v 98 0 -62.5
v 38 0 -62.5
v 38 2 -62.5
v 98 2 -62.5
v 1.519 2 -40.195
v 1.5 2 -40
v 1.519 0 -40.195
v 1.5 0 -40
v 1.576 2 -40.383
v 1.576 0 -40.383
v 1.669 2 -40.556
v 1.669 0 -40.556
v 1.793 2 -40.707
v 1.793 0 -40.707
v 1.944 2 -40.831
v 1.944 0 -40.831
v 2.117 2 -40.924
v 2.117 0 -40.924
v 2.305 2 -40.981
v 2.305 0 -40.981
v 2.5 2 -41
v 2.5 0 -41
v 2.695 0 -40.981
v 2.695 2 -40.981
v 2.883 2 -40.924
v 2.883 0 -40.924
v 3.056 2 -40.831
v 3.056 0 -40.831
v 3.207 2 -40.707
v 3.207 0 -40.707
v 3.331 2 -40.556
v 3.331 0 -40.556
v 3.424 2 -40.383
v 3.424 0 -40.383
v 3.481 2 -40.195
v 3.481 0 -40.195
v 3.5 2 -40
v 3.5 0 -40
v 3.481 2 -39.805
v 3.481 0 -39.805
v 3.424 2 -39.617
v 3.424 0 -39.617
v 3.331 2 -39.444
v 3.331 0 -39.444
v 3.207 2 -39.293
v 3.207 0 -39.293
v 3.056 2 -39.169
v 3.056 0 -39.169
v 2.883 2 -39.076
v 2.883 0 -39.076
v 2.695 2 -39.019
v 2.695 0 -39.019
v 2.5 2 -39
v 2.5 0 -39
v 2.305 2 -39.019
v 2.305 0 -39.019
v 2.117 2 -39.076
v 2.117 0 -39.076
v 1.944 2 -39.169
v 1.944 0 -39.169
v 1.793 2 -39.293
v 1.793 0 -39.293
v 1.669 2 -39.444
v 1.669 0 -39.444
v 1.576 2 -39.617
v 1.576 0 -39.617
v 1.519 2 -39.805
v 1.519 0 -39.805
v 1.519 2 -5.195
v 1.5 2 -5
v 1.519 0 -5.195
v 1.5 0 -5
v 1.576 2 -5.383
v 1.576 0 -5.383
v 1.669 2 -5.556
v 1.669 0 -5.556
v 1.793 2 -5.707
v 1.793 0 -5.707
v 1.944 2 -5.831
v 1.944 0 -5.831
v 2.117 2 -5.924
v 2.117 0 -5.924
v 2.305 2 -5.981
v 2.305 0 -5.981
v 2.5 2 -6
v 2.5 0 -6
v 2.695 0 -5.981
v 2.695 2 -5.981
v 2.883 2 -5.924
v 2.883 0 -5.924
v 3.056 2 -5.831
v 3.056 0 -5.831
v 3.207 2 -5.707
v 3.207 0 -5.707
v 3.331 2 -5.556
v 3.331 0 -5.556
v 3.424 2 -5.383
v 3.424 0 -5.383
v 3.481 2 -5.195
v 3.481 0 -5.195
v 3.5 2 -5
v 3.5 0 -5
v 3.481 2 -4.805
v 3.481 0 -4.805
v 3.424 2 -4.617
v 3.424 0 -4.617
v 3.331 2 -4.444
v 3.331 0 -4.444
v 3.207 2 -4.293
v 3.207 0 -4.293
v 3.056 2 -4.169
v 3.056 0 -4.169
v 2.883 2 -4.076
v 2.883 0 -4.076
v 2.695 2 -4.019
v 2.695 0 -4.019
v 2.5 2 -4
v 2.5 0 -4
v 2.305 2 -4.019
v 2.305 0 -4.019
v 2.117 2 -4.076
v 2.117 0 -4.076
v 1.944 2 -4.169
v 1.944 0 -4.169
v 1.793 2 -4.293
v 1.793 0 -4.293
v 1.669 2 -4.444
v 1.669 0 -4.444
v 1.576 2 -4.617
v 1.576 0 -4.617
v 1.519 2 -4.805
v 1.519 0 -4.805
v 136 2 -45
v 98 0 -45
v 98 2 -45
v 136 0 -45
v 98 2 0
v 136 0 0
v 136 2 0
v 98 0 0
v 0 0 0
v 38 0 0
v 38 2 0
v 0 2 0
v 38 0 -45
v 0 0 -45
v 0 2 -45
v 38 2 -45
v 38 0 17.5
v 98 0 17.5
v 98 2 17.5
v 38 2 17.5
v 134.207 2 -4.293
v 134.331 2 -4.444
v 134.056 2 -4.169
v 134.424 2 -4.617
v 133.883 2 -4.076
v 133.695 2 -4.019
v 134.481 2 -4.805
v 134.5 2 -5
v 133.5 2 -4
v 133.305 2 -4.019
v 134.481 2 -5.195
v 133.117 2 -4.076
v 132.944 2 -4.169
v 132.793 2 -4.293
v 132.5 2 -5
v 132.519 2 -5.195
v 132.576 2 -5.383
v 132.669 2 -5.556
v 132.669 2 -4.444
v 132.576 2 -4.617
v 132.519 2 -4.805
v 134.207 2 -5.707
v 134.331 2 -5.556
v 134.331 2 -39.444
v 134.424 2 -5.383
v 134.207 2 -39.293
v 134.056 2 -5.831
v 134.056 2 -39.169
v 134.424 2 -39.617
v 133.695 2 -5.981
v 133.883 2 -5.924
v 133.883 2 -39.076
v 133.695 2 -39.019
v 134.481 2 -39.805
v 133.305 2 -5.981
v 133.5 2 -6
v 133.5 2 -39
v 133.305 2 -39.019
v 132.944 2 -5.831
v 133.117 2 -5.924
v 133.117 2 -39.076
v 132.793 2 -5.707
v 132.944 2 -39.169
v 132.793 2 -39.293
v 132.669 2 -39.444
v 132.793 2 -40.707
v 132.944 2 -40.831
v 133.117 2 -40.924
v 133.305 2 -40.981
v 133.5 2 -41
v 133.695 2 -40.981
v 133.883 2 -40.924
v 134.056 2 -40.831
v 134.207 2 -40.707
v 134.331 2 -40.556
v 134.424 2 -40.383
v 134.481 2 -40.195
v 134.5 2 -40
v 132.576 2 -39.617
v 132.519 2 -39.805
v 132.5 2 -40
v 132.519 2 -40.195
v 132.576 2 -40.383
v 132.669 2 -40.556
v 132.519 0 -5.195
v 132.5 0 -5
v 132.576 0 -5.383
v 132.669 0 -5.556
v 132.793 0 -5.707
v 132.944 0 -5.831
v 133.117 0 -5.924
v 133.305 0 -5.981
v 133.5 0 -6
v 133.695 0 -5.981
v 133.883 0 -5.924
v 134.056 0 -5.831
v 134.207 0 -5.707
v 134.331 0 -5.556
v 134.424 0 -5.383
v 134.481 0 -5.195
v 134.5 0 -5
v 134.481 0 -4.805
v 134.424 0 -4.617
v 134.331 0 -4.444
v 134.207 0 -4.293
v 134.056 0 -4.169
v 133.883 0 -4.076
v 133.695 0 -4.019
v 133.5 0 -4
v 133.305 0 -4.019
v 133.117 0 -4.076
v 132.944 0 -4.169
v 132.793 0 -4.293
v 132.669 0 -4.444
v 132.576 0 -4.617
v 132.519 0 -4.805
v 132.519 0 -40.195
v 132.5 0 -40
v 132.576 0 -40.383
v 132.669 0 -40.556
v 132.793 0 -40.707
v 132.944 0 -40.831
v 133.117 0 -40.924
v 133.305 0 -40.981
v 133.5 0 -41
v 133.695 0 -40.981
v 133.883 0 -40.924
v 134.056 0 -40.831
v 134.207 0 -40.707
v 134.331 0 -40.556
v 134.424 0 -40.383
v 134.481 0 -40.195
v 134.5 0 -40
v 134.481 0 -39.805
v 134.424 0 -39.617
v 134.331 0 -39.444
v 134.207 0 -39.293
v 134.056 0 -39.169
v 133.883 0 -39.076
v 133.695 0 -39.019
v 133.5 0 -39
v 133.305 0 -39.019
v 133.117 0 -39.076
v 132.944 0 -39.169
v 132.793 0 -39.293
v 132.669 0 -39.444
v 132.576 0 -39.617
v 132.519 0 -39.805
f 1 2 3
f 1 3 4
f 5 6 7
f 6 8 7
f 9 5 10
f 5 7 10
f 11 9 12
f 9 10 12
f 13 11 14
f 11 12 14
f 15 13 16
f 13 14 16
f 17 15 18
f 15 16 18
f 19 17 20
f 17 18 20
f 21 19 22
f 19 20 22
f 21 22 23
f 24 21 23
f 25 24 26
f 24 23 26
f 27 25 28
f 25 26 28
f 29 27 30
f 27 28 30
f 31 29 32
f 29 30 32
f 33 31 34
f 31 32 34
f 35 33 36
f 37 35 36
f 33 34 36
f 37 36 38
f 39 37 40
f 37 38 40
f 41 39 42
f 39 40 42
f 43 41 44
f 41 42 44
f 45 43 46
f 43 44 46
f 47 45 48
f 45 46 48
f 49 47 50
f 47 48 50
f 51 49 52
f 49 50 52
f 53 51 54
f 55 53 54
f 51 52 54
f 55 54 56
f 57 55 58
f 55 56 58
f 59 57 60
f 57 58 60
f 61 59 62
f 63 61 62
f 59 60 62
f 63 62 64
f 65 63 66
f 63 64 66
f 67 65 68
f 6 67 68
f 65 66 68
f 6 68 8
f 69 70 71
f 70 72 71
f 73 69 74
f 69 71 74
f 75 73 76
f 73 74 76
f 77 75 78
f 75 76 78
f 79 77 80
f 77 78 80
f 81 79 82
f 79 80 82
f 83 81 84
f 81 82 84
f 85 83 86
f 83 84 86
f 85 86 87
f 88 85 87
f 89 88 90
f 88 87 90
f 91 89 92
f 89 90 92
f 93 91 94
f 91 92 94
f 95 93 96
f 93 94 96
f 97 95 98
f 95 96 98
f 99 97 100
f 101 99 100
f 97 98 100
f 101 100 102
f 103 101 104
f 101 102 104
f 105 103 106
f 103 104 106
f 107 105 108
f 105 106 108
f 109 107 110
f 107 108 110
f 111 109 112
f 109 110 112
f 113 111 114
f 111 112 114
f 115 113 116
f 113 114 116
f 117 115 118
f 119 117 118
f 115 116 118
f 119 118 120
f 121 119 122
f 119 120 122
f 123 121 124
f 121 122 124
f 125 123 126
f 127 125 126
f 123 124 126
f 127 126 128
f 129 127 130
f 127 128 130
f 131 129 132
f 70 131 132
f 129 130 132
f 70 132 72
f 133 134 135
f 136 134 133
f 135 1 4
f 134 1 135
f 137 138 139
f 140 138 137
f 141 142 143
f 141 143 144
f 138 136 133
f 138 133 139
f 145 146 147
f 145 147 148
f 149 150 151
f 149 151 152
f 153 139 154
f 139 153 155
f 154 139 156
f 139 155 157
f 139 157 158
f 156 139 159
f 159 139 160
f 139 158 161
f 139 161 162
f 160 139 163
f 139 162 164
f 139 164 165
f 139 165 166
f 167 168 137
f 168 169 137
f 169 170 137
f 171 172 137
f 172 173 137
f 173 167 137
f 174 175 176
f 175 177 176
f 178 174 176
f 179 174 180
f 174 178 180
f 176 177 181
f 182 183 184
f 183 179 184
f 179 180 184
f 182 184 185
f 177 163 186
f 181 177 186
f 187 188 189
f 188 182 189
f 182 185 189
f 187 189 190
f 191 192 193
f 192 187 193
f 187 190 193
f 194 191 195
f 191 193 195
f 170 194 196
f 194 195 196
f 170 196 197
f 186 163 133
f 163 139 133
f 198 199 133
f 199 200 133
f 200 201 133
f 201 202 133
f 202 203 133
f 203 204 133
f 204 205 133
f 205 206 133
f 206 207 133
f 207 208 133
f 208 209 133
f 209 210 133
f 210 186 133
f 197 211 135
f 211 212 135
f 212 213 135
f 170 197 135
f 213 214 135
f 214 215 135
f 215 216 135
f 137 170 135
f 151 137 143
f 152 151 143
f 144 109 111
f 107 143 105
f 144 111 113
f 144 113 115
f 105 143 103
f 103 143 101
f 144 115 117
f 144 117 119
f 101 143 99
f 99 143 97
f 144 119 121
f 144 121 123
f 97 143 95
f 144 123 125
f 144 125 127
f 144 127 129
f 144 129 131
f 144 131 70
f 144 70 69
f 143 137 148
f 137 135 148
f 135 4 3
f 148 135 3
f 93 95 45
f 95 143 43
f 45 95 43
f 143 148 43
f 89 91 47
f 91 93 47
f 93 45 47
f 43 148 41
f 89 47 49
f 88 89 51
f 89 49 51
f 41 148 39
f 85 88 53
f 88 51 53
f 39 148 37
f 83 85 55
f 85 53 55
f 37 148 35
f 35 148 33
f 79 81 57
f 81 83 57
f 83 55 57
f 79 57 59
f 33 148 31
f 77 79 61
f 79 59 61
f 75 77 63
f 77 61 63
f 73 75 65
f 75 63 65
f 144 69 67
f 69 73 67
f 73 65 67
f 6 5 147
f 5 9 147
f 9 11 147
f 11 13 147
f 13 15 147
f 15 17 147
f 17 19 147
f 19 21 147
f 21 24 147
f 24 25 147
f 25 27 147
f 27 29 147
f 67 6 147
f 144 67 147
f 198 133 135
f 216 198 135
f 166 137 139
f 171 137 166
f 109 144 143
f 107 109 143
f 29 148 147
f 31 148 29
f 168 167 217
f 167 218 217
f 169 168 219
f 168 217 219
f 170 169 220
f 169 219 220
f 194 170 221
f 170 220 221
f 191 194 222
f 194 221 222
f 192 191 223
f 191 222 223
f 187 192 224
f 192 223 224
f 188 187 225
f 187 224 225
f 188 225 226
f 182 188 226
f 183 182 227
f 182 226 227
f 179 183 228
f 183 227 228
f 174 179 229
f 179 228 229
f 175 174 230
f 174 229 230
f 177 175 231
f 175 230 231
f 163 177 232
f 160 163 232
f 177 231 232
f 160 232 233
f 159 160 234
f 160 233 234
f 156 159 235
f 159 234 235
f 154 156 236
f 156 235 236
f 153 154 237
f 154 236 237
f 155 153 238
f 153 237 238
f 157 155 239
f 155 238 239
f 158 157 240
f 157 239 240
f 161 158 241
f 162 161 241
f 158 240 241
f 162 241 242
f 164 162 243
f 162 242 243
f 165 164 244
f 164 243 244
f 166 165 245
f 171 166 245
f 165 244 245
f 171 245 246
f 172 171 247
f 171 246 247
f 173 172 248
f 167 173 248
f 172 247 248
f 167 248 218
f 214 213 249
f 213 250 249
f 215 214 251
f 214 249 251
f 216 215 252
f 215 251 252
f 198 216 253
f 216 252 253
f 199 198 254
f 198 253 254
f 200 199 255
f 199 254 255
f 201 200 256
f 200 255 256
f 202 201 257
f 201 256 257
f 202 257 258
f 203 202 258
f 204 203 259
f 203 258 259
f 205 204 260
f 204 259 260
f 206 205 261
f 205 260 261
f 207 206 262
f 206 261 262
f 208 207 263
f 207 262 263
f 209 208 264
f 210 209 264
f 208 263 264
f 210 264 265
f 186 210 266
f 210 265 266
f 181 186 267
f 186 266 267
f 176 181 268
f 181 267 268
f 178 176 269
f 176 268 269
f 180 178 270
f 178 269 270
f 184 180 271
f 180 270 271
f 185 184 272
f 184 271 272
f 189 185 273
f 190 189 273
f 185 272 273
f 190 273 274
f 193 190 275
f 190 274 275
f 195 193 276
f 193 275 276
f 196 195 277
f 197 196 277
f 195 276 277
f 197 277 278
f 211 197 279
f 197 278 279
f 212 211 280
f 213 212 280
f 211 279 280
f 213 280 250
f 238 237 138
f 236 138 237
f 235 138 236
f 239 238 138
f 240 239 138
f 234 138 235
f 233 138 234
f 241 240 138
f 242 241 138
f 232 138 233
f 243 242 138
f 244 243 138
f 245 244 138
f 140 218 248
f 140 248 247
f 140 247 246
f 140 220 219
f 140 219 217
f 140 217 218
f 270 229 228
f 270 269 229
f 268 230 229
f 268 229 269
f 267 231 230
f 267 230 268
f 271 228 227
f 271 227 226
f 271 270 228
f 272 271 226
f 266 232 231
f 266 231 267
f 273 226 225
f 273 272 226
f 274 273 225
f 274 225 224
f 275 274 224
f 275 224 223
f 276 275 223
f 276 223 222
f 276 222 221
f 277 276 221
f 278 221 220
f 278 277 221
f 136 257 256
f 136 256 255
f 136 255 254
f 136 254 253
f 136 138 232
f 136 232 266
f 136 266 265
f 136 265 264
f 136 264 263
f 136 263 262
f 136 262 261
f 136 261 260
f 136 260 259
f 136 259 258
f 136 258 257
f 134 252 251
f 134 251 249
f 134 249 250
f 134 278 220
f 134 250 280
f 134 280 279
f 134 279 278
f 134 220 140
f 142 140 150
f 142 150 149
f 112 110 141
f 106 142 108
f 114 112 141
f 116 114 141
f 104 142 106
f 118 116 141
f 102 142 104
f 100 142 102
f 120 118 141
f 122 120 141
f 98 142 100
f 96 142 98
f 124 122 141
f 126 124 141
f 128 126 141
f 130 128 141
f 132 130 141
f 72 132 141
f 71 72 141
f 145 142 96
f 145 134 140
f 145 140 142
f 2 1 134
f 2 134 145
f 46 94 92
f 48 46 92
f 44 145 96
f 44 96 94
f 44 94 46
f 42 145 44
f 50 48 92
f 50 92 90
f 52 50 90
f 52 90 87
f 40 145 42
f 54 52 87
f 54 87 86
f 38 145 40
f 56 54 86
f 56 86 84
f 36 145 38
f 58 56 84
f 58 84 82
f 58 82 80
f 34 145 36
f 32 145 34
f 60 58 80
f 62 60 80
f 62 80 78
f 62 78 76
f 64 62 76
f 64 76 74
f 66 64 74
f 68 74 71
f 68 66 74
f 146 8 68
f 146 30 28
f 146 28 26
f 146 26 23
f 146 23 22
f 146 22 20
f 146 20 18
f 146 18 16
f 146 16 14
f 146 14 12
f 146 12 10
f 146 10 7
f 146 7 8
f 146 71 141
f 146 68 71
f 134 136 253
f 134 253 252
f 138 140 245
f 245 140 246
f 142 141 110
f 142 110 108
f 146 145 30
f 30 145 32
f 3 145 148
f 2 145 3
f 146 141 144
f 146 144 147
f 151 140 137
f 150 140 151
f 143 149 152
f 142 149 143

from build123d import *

# Parameters (mm, degrees)
BOSS_EXTRUDE1_DEPTH      = 2
M2_CLEARANCE_HOLE1_D     = 2
M2_CLEARANCE_HOLE1_DEPTH = 2
M2_CLEARANCE_HOLE1_TIP   = 0.600860619


with BuildPart() as part:
    # Sketch1 → Boss-Extrude1 (new body)
    with BuildSketch(Plane(origin=(0, 0, 0), x_dir=(1, 0, 0), z_dir=(0, 1, 0))):
        Polygon((98, 45), (136, 45), (136, 0), (98, 0), (98, -17.5), (38, -17.5), (38, 0), (0, 0), (0, 45), (38, 45), (38, 62.5), (98, 62.5), align=None)
    extrude(amount=BOSS_EXTRUDE1_DEPTH)

    # M2 Clearance Hole1
    with Locations(Plane(origin=(0, 2, 0), x_dir=(1, 0, 0), z_dir=(0, 1, 0))):
        with Locations((2.5, 5), (2.5, 40), (133.5, 40), (133.5, 5)):
            Hole(M2_CLEARANCE_HOLE1_D / 2, depth=M2_CLEARANCE_HOLE1_DEPTH)
            with Locations((0, 0, -(M2_CLEARANCE_HOLE1_DEPTH + M2_CLEARANCE_HOLE1_TIP / 2))):  # 118° drill point
                Cone(0, M2_CLEARANCE_HOLE1_D / 2, M2_CLEARANCE_HOLE1_TIP, mode=Mode.SUBTRACT)


solid = part.part
